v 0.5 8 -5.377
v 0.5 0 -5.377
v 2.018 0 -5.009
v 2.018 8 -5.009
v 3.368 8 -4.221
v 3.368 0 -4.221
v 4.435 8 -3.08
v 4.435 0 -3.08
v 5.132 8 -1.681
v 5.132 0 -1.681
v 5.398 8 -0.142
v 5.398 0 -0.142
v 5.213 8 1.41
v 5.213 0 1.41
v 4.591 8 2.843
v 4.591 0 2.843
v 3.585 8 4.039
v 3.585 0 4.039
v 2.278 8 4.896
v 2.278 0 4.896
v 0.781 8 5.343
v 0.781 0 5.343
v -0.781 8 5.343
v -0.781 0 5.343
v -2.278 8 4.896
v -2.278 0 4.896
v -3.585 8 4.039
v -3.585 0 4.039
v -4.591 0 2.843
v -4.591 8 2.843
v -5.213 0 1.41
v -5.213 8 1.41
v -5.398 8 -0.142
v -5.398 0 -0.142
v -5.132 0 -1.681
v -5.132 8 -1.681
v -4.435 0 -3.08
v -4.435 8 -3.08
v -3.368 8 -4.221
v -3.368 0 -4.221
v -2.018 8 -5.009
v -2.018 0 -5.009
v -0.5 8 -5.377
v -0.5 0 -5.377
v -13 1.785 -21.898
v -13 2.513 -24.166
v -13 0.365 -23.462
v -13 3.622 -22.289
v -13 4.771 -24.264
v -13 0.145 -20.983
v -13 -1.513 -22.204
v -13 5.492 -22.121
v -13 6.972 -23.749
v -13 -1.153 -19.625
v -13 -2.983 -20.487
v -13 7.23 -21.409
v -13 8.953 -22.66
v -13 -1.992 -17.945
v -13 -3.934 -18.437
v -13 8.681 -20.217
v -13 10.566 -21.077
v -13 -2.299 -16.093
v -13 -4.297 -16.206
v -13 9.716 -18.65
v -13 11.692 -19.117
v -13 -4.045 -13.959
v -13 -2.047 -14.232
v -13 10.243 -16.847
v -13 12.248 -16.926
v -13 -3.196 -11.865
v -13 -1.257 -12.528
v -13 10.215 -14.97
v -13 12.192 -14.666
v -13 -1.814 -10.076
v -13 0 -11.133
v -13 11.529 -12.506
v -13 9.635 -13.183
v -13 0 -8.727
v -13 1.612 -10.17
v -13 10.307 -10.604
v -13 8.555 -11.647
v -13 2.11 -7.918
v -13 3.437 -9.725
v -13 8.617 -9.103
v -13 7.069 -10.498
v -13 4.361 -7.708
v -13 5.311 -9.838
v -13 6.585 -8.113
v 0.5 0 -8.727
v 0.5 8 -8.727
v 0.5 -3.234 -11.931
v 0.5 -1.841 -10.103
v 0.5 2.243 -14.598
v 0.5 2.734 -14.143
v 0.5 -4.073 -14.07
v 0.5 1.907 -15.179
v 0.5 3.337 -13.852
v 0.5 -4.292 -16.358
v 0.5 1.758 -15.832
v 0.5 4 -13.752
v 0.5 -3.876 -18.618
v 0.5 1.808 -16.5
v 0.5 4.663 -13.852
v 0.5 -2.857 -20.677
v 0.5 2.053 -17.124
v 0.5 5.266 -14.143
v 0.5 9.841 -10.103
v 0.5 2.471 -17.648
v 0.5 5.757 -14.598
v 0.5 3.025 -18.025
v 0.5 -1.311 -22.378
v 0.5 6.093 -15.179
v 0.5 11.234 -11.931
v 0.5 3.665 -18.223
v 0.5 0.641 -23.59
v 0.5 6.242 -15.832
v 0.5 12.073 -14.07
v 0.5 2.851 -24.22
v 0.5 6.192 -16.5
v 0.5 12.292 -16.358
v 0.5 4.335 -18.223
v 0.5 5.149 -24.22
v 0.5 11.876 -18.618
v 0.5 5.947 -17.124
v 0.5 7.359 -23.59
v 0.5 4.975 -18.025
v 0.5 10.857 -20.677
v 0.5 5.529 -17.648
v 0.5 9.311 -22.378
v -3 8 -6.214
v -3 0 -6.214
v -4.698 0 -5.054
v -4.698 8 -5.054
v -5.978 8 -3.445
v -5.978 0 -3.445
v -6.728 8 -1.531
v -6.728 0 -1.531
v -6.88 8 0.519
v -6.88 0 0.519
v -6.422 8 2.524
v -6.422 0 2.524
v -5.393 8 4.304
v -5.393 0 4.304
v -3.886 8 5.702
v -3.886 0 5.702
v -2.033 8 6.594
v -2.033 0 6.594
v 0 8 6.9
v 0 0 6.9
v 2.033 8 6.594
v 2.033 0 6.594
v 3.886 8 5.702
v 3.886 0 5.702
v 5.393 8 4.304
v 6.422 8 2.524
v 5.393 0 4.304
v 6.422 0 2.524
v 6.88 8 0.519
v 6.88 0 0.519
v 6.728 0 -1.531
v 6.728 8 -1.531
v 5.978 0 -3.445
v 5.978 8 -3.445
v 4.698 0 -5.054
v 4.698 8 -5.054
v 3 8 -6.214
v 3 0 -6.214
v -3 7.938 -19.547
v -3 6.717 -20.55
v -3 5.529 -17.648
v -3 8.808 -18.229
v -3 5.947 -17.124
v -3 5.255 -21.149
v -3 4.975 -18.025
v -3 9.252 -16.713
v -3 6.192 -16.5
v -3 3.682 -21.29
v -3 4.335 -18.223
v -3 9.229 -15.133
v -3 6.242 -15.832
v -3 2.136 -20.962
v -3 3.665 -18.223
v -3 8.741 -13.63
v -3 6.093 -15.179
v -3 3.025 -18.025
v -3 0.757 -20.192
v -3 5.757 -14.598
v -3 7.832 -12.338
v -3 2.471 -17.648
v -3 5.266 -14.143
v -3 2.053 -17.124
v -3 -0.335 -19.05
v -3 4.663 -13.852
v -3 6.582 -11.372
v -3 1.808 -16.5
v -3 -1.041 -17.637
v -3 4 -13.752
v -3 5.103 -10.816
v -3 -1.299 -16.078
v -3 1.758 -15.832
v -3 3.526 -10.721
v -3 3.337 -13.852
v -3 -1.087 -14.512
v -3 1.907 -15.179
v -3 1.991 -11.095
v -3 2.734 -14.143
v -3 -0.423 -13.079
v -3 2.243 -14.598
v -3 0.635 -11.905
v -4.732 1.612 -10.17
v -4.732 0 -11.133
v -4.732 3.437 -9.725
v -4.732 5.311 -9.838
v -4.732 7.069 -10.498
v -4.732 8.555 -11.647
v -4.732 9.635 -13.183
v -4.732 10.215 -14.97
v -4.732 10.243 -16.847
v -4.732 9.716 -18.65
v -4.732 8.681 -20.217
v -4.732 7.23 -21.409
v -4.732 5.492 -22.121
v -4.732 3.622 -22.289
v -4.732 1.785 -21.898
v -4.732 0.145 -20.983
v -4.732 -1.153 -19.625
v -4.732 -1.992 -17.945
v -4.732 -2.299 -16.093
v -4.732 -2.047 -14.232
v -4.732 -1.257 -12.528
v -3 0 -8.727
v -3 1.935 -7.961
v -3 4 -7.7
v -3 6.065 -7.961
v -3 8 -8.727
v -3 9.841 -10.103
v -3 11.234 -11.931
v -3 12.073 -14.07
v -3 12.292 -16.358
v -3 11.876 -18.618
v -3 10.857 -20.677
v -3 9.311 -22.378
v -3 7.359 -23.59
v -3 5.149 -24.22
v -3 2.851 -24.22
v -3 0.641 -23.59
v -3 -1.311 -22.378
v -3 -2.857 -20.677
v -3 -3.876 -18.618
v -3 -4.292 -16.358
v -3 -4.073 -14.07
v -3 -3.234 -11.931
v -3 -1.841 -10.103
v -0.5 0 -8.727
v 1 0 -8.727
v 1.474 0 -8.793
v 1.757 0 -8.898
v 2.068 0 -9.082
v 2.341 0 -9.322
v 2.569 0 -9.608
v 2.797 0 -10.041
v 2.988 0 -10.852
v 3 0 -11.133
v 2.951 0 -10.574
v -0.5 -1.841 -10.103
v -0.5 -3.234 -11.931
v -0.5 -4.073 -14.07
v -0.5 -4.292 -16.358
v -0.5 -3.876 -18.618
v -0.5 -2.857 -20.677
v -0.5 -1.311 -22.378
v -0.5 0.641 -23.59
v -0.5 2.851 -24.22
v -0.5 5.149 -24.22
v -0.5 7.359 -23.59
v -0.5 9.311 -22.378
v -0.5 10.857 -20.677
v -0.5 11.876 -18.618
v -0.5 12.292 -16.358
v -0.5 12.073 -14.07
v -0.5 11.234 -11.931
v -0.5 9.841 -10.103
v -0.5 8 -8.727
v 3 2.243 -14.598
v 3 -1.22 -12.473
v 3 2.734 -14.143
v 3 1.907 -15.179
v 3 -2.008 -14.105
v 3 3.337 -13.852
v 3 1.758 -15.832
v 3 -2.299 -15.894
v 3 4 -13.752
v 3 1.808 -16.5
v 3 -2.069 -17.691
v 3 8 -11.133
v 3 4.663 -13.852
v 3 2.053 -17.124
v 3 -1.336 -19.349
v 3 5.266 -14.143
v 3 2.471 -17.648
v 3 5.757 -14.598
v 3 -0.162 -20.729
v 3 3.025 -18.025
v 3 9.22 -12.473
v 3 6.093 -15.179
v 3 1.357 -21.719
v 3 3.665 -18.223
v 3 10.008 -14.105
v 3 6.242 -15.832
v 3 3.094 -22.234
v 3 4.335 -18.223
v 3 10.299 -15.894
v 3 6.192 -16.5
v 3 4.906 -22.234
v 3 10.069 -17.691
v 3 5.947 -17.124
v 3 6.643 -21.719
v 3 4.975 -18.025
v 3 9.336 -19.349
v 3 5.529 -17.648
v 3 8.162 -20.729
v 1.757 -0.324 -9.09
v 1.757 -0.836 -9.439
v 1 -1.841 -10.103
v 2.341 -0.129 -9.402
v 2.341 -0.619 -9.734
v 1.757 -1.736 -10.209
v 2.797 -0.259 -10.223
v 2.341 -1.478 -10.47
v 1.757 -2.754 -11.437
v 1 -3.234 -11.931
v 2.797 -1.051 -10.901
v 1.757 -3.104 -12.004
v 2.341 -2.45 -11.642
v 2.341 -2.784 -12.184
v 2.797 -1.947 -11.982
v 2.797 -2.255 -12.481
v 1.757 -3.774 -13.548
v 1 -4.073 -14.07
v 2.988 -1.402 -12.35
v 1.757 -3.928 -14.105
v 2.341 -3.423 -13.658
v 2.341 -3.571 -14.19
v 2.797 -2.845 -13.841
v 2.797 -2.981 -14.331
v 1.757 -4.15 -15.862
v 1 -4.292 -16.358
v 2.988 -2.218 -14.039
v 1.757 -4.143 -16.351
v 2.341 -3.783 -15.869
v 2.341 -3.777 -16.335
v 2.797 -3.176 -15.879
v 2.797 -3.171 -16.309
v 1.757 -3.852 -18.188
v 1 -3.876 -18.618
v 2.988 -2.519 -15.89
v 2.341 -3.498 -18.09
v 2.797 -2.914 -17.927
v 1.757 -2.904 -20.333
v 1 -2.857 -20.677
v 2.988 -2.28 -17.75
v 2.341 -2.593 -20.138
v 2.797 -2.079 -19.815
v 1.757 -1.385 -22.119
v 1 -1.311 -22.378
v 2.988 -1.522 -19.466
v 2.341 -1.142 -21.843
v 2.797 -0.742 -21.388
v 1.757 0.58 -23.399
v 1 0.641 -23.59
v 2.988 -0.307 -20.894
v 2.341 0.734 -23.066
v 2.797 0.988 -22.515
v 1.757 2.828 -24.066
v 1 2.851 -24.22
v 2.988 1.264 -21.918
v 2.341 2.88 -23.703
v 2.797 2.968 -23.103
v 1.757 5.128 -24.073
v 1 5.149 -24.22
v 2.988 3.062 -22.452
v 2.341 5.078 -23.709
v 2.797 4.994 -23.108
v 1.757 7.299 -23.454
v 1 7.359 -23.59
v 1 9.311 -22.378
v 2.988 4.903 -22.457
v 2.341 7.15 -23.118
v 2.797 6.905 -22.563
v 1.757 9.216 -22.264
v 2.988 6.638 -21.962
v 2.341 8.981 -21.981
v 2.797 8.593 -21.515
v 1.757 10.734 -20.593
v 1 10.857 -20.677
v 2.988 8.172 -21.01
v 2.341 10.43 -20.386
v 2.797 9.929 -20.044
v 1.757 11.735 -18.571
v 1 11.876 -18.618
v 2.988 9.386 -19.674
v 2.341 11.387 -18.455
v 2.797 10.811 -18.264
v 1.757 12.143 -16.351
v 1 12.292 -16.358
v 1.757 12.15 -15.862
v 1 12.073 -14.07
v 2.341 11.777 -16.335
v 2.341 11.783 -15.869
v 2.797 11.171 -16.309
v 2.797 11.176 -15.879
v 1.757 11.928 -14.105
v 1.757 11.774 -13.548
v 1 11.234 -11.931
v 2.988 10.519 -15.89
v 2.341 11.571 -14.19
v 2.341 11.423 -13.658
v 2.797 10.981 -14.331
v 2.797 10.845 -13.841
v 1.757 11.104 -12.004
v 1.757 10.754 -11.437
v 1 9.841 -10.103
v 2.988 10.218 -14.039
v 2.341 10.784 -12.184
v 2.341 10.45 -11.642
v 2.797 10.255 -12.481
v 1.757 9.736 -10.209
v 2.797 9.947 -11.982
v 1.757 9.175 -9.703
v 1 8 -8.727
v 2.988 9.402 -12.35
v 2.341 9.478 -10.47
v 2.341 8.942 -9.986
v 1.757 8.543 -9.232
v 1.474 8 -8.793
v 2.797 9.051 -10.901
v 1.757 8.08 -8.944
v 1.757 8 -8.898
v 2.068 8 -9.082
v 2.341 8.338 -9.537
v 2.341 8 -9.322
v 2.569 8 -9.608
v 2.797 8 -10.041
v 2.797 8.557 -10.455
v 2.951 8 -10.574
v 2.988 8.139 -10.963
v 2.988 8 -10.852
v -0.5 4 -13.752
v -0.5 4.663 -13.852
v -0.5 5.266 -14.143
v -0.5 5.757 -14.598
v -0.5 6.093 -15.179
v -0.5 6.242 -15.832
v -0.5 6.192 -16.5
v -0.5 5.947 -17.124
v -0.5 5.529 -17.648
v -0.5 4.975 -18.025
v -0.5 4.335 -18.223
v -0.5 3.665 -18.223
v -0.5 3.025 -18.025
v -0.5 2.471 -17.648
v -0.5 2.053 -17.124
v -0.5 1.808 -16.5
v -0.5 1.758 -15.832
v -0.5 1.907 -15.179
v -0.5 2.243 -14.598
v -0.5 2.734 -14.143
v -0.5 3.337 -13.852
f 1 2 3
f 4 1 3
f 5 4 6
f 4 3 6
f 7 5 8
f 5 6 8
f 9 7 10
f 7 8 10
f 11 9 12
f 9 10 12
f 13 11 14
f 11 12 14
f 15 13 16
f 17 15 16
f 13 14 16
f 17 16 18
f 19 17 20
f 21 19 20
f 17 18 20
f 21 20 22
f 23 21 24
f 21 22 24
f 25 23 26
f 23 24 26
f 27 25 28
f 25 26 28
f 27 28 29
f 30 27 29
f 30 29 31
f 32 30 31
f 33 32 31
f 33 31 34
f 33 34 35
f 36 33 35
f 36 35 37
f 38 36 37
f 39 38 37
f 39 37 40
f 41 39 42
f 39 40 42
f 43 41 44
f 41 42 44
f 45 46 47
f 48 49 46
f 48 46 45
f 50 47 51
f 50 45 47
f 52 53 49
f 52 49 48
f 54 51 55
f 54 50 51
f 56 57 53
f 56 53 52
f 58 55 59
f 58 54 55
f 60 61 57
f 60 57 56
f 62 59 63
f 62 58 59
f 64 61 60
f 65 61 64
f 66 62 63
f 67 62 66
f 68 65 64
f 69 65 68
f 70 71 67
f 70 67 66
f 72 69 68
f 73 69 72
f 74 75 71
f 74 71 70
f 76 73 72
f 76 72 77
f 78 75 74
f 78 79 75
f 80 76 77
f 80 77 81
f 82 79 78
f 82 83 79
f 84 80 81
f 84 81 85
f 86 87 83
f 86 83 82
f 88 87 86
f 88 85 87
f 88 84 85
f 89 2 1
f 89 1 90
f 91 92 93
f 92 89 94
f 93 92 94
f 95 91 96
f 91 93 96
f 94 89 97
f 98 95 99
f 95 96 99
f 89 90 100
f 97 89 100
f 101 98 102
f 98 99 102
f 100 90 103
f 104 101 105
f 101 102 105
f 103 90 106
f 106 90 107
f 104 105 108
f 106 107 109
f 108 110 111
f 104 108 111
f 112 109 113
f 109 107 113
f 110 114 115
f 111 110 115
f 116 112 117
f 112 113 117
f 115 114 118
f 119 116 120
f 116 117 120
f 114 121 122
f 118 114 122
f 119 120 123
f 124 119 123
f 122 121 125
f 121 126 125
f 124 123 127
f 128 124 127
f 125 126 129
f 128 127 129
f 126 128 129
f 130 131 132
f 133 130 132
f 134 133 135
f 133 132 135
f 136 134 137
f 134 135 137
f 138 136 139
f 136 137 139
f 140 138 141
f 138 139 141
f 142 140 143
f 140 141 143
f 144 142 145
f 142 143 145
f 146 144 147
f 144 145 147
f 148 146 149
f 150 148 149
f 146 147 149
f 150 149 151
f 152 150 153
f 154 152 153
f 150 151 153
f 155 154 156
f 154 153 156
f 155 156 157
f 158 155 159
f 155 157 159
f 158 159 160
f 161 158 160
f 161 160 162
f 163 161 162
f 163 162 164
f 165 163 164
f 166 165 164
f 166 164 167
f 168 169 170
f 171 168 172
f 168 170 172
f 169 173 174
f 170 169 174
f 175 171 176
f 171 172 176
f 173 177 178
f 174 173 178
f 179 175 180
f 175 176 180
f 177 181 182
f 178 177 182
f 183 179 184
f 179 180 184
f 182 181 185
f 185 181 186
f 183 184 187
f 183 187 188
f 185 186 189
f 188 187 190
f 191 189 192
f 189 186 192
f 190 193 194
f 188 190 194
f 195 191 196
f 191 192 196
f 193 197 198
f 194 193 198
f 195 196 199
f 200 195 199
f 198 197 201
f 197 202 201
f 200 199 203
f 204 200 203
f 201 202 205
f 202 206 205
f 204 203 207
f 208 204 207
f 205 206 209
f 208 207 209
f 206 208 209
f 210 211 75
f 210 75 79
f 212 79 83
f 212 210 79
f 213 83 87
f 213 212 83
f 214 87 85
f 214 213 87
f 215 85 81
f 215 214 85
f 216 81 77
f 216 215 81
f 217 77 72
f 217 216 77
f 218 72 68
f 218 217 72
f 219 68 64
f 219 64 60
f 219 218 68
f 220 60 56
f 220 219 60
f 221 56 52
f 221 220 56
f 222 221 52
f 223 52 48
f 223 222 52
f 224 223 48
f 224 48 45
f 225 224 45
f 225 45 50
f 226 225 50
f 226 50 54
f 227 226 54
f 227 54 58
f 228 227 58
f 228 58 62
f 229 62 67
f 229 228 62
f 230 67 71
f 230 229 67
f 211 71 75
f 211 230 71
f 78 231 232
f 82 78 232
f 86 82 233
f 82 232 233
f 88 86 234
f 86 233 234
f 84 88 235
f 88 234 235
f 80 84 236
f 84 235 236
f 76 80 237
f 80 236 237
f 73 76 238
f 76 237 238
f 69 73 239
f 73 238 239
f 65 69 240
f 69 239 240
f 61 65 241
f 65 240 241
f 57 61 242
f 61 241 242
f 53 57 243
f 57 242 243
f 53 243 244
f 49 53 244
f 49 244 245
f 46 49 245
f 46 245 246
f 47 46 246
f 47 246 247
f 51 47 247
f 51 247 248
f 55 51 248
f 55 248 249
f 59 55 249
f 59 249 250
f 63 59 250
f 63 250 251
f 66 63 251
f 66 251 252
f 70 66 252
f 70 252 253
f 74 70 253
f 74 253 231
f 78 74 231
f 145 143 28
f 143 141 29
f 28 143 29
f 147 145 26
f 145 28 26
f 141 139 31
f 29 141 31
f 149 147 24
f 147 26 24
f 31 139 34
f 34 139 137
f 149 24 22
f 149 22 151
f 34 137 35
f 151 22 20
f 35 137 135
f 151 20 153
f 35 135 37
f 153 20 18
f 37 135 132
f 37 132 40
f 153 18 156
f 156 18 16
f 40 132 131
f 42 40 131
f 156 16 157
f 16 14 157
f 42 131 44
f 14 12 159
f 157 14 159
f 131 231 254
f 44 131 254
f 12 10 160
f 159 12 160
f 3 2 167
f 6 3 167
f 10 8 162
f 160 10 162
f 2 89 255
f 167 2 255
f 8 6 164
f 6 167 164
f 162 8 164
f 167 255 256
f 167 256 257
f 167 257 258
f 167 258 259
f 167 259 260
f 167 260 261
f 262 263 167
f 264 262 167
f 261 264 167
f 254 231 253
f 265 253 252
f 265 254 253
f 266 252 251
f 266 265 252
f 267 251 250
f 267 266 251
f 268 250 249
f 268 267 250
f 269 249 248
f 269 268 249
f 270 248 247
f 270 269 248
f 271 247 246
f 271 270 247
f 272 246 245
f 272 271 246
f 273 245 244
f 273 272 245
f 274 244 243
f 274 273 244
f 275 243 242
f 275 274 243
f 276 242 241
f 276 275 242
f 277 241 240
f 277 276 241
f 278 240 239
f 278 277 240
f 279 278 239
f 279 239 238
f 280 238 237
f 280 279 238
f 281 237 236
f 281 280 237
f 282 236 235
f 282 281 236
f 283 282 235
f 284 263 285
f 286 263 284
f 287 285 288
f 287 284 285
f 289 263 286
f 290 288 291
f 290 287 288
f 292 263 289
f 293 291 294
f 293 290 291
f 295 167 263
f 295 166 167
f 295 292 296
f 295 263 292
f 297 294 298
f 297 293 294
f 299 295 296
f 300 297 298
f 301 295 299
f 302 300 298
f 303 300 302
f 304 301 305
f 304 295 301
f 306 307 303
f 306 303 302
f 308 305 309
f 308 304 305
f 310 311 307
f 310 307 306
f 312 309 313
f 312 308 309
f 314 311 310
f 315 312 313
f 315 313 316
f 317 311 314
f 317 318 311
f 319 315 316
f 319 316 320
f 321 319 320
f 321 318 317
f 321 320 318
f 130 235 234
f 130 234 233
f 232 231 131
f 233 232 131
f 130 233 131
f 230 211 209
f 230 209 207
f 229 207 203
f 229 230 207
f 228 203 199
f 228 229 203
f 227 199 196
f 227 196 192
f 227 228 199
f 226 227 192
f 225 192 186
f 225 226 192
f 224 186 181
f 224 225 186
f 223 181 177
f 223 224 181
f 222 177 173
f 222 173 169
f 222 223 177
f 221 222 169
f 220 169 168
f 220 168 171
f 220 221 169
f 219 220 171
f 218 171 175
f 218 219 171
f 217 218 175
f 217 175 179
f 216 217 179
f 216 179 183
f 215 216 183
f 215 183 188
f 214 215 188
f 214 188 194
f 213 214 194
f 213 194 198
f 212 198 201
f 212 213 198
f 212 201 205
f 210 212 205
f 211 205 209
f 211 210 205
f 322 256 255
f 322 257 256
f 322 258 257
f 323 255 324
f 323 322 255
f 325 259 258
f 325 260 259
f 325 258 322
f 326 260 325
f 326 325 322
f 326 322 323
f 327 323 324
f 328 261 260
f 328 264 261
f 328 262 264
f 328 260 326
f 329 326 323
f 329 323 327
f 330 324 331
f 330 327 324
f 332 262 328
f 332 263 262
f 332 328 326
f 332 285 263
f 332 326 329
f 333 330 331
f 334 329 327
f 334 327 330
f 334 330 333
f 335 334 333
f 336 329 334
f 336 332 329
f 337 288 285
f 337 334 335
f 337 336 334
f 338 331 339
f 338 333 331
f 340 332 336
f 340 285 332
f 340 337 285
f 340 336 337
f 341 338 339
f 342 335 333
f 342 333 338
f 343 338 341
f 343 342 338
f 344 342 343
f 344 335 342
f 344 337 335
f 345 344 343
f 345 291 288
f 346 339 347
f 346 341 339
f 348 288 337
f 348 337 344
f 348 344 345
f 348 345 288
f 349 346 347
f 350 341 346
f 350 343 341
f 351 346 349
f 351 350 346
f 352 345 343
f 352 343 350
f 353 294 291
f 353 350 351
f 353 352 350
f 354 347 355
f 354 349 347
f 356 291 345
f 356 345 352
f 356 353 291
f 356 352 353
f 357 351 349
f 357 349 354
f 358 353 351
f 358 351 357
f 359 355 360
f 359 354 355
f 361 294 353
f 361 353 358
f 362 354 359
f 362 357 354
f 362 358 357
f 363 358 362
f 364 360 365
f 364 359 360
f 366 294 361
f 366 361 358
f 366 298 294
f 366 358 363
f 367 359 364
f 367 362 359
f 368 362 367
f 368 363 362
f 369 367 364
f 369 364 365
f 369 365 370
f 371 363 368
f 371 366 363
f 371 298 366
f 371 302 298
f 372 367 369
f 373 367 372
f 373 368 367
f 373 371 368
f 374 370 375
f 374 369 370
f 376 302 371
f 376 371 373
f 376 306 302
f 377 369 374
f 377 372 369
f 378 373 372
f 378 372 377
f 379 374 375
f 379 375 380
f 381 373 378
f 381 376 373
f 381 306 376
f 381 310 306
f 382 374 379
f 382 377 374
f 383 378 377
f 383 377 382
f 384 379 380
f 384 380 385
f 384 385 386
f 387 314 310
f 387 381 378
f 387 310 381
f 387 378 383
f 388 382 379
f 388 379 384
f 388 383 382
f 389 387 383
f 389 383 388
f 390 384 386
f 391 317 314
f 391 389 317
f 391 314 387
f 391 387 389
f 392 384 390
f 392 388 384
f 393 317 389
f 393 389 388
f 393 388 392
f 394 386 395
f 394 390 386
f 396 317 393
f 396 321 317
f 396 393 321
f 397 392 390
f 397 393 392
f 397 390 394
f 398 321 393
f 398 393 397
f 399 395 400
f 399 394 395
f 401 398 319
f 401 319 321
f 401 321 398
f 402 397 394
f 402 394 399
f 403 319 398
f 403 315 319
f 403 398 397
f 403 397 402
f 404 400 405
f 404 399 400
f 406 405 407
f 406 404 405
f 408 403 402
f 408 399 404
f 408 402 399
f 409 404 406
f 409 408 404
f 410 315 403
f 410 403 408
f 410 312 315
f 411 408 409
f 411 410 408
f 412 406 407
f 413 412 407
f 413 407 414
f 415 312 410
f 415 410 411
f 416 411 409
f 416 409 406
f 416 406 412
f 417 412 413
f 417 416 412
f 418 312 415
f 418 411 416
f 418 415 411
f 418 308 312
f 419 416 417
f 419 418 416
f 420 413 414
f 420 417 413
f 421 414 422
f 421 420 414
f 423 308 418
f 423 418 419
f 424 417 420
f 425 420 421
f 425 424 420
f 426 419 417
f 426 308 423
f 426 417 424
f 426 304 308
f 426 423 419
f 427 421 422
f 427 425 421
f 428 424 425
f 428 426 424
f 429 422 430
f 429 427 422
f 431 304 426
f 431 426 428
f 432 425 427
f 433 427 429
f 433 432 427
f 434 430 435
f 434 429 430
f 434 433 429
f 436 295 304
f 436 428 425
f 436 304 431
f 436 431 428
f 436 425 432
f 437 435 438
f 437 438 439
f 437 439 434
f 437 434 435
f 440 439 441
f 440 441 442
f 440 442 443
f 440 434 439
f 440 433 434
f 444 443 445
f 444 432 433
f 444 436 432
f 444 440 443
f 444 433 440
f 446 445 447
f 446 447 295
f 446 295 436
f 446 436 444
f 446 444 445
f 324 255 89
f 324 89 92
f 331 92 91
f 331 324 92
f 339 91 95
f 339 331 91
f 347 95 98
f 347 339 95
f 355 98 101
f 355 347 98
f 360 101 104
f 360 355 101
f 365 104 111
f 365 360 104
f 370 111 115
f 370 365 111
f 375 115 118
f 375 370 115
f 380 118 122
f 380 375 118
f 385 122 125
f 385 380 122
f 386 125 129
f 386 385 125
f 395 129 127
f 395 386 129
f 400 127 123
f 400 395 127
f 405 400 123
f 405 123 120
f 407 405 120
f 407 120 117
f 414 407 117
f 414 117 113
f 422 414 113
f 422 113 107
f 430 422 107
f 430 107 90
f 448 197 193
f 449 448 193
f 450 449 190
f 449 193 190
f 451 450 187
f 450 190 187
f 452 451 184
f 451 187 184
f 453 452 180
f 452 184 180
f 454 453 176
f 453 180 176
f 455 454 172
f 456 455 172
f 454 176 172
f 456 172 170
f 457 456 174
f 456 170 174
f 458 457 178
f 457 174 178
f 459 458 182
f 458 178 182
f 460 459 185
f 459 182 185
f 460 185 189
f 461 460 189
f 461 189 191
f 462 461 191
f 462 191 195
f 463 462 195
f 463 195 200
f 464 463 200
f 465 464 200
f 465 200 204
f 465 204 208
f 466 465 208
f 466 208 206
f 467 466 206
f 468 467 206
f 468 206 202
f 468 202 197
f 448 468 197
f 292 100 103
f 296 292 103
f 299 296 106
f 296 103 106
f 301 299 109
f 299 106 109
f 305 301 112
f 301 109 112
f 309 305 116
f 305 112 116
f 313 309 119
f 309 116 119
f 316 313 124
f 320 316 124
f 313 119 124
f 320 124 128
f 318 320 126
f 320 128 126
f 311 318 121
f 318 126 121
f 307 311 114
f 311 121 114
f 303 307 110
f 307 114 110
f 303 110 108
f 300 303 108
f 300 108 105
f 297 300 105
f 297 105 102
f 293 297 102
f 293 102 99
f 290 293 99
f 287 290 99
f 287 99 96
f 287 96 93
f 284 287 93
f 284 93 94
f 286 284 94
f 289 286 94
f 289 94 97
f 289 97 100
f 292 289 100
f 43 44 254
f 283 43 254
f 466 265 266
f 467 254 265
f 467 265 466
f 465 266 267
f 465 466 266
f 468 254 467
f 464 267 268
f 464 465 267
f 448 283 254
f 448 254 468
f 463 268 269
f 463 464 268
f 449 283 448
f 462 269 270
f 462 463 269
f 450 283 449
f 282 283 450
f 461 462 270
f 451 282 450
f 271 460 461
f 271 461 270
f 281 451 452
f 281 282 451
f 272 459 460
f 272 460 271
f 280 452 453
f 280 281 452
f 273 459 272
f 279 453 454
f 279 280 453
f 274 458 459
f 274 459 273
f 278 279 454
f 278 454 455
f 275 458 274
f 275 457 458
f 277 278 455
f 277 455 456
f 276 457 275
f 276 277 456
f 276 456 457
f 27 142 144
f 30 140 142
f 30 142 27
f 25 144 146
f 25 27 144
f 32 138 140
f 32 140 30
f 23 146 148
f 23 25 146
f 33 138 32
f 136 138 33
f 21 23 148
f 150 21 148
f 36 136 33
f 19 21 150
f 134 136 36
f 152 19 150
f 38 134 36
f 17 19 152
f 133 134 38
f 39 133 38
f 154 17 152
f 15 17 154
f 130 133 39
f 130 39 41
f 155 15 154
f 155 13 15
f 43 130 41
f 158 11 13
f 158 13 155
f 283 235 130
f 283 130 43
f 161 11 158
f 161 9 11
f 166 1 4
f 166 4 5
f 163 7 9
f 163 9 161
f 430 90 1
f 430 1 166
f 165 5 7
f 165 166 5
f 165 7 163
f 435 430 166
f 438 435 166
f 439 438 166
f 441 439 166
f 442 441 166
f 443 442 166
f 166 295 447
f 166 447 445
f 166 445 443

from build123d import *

# Parameters (mm, degrees)
BOSS_EXTRUDE1_DEPTH   = 8
F_8_CLEARANCE_HOLE1_D = 4.4958
SKETCH5_R             = 8.3
SKETCH5_R_2           = 6.3
BOSS_EXTRUDE2_DEPTH   = 10
BOSS_EXTRUDE3_DEPTH   = 2.5
BOSS_EXTRUDE4_START   = 3.5
BOSS_EXTRUDE4_DEPTH   = 2.5
FILLET1_R             = 2
CHAMFER1_SIZE         = 1
CHAMFER1_SIZE2        = 1.732050808


with BuildPart() as part:
    # Sketch1 → Boss-Extrude1 (new body)
    with BuildSketch(Plane(origin=(0, 0, 0), x_dir=(1, 0, 0), z_dir=(0, 1, 0))):
        with BuildLine():
            Line((3, 6.213694553), (3, 20))
            Line((3, 20), (0.5, 20))
            Line((0.5, 20), (0.5, 5.376802024))
            ThreePointArc((0.5, 5.376802024), (0, -5.4), (-0.5, 5.376802024))
            Line((-0.5, 5.376802024), (-0.5, 20))
            Line((-0.5, 20), (-3, 20))
            Line((-3, 20), (-3, 6.213694553))
            ThreePointArc((-3, 6.213694553), (0, -6.9), (3, 6.213694553))
        make_face()
    extrude(amount=BOSS_EXTRUDE1_DEPTH)

    # #8 Clearance Hole1 (through all)
    with Locations(Plane(origin=(3, 0, 0), x_dir=(0, 0, -1), z_dir=(1, 0, 0))):
        with Locations((16, 4)):
            Hole(F_8_CLEARANCE_HOLE1_D / 2)

    # Sketch5 → Boss-Extrude2 (add)
    with BuildSketch(Plane.ZY.offset(3)):
        with Locations(Location((-16, 4, 0), (0, 0, 331.188620291))):
            Circle(SKETCH5_R)
        with Locations(Location((-16, 4, 0), (0, 0, 320.585901644))):
            Circle(SKETCH5_R_2, mode=Mode.SUBTRACT)
    extrude(amount=BOSS_EXTRUDE2_DEPTH)

    # Sketch6 → Boss-Extrude3 (add)
    with BuildSketch(Plane(origin=(-0.5, 0, 0), x_dir=(0, 0, -1), z_dir=(1, 0, 0))):
        with BuildLine():
            Line((20, 0), (8.727448866, 0))
            ThreePointArc((8.727448866, 0), (24.3, 4), (8.727448866, 8))
            Line((8.727448866, 8), (20, 8))
            Line((20, 8), (20, 0))
        make_face()
    extrude(amount=-BOSS_EXTRUDE3_DEPTH)

    # Sketch6<4> → Boss-Extrude4 (add)
    with BuildSketch(Plane(origin=(-0.5, 0, 0), x_dir=(0, 0, -1), z_dir=(1, 0, 0)).offset(BOSS_EXTRUDE4_START)):
        with BuildLine():
            Line((20, 0), (8.727448866, 0))
            ThreePointArc((8.727448866, 0), (24.3, 4), (8.727448866, 8))
            Line((8.727448866, 8), (20, 8))
            Line((20, 8), (20, 0))
        make_face()
    extrude(amount=-BOSS_EXTRUDE4_DEPTH)

    # Fillet1
    fillet1_edges = [part.edges().sort_by_distance(p)[0] for p in [
        (3, 4, -24.3),
    ]]
    fillet(fillet1_edges, radius=FILLET1_R)

    # Chamfer1
    chamfer1_edges = [part.edges().sort_by_distance(p)[0] for p in [
        (-3, 4, -9.7),
    ]]
    chamfer1_side = [part.faces().sort_by_distance(p)[0] for p in [
        (-3, 0.130418557, -15.566381295),
    ]]
    chamfer(chamfer1_edges, length=CHAMFER1_SIZE, length2=CHAMFER1_SIZE2, reference=chamfer1_side[0])


solid = part.part
